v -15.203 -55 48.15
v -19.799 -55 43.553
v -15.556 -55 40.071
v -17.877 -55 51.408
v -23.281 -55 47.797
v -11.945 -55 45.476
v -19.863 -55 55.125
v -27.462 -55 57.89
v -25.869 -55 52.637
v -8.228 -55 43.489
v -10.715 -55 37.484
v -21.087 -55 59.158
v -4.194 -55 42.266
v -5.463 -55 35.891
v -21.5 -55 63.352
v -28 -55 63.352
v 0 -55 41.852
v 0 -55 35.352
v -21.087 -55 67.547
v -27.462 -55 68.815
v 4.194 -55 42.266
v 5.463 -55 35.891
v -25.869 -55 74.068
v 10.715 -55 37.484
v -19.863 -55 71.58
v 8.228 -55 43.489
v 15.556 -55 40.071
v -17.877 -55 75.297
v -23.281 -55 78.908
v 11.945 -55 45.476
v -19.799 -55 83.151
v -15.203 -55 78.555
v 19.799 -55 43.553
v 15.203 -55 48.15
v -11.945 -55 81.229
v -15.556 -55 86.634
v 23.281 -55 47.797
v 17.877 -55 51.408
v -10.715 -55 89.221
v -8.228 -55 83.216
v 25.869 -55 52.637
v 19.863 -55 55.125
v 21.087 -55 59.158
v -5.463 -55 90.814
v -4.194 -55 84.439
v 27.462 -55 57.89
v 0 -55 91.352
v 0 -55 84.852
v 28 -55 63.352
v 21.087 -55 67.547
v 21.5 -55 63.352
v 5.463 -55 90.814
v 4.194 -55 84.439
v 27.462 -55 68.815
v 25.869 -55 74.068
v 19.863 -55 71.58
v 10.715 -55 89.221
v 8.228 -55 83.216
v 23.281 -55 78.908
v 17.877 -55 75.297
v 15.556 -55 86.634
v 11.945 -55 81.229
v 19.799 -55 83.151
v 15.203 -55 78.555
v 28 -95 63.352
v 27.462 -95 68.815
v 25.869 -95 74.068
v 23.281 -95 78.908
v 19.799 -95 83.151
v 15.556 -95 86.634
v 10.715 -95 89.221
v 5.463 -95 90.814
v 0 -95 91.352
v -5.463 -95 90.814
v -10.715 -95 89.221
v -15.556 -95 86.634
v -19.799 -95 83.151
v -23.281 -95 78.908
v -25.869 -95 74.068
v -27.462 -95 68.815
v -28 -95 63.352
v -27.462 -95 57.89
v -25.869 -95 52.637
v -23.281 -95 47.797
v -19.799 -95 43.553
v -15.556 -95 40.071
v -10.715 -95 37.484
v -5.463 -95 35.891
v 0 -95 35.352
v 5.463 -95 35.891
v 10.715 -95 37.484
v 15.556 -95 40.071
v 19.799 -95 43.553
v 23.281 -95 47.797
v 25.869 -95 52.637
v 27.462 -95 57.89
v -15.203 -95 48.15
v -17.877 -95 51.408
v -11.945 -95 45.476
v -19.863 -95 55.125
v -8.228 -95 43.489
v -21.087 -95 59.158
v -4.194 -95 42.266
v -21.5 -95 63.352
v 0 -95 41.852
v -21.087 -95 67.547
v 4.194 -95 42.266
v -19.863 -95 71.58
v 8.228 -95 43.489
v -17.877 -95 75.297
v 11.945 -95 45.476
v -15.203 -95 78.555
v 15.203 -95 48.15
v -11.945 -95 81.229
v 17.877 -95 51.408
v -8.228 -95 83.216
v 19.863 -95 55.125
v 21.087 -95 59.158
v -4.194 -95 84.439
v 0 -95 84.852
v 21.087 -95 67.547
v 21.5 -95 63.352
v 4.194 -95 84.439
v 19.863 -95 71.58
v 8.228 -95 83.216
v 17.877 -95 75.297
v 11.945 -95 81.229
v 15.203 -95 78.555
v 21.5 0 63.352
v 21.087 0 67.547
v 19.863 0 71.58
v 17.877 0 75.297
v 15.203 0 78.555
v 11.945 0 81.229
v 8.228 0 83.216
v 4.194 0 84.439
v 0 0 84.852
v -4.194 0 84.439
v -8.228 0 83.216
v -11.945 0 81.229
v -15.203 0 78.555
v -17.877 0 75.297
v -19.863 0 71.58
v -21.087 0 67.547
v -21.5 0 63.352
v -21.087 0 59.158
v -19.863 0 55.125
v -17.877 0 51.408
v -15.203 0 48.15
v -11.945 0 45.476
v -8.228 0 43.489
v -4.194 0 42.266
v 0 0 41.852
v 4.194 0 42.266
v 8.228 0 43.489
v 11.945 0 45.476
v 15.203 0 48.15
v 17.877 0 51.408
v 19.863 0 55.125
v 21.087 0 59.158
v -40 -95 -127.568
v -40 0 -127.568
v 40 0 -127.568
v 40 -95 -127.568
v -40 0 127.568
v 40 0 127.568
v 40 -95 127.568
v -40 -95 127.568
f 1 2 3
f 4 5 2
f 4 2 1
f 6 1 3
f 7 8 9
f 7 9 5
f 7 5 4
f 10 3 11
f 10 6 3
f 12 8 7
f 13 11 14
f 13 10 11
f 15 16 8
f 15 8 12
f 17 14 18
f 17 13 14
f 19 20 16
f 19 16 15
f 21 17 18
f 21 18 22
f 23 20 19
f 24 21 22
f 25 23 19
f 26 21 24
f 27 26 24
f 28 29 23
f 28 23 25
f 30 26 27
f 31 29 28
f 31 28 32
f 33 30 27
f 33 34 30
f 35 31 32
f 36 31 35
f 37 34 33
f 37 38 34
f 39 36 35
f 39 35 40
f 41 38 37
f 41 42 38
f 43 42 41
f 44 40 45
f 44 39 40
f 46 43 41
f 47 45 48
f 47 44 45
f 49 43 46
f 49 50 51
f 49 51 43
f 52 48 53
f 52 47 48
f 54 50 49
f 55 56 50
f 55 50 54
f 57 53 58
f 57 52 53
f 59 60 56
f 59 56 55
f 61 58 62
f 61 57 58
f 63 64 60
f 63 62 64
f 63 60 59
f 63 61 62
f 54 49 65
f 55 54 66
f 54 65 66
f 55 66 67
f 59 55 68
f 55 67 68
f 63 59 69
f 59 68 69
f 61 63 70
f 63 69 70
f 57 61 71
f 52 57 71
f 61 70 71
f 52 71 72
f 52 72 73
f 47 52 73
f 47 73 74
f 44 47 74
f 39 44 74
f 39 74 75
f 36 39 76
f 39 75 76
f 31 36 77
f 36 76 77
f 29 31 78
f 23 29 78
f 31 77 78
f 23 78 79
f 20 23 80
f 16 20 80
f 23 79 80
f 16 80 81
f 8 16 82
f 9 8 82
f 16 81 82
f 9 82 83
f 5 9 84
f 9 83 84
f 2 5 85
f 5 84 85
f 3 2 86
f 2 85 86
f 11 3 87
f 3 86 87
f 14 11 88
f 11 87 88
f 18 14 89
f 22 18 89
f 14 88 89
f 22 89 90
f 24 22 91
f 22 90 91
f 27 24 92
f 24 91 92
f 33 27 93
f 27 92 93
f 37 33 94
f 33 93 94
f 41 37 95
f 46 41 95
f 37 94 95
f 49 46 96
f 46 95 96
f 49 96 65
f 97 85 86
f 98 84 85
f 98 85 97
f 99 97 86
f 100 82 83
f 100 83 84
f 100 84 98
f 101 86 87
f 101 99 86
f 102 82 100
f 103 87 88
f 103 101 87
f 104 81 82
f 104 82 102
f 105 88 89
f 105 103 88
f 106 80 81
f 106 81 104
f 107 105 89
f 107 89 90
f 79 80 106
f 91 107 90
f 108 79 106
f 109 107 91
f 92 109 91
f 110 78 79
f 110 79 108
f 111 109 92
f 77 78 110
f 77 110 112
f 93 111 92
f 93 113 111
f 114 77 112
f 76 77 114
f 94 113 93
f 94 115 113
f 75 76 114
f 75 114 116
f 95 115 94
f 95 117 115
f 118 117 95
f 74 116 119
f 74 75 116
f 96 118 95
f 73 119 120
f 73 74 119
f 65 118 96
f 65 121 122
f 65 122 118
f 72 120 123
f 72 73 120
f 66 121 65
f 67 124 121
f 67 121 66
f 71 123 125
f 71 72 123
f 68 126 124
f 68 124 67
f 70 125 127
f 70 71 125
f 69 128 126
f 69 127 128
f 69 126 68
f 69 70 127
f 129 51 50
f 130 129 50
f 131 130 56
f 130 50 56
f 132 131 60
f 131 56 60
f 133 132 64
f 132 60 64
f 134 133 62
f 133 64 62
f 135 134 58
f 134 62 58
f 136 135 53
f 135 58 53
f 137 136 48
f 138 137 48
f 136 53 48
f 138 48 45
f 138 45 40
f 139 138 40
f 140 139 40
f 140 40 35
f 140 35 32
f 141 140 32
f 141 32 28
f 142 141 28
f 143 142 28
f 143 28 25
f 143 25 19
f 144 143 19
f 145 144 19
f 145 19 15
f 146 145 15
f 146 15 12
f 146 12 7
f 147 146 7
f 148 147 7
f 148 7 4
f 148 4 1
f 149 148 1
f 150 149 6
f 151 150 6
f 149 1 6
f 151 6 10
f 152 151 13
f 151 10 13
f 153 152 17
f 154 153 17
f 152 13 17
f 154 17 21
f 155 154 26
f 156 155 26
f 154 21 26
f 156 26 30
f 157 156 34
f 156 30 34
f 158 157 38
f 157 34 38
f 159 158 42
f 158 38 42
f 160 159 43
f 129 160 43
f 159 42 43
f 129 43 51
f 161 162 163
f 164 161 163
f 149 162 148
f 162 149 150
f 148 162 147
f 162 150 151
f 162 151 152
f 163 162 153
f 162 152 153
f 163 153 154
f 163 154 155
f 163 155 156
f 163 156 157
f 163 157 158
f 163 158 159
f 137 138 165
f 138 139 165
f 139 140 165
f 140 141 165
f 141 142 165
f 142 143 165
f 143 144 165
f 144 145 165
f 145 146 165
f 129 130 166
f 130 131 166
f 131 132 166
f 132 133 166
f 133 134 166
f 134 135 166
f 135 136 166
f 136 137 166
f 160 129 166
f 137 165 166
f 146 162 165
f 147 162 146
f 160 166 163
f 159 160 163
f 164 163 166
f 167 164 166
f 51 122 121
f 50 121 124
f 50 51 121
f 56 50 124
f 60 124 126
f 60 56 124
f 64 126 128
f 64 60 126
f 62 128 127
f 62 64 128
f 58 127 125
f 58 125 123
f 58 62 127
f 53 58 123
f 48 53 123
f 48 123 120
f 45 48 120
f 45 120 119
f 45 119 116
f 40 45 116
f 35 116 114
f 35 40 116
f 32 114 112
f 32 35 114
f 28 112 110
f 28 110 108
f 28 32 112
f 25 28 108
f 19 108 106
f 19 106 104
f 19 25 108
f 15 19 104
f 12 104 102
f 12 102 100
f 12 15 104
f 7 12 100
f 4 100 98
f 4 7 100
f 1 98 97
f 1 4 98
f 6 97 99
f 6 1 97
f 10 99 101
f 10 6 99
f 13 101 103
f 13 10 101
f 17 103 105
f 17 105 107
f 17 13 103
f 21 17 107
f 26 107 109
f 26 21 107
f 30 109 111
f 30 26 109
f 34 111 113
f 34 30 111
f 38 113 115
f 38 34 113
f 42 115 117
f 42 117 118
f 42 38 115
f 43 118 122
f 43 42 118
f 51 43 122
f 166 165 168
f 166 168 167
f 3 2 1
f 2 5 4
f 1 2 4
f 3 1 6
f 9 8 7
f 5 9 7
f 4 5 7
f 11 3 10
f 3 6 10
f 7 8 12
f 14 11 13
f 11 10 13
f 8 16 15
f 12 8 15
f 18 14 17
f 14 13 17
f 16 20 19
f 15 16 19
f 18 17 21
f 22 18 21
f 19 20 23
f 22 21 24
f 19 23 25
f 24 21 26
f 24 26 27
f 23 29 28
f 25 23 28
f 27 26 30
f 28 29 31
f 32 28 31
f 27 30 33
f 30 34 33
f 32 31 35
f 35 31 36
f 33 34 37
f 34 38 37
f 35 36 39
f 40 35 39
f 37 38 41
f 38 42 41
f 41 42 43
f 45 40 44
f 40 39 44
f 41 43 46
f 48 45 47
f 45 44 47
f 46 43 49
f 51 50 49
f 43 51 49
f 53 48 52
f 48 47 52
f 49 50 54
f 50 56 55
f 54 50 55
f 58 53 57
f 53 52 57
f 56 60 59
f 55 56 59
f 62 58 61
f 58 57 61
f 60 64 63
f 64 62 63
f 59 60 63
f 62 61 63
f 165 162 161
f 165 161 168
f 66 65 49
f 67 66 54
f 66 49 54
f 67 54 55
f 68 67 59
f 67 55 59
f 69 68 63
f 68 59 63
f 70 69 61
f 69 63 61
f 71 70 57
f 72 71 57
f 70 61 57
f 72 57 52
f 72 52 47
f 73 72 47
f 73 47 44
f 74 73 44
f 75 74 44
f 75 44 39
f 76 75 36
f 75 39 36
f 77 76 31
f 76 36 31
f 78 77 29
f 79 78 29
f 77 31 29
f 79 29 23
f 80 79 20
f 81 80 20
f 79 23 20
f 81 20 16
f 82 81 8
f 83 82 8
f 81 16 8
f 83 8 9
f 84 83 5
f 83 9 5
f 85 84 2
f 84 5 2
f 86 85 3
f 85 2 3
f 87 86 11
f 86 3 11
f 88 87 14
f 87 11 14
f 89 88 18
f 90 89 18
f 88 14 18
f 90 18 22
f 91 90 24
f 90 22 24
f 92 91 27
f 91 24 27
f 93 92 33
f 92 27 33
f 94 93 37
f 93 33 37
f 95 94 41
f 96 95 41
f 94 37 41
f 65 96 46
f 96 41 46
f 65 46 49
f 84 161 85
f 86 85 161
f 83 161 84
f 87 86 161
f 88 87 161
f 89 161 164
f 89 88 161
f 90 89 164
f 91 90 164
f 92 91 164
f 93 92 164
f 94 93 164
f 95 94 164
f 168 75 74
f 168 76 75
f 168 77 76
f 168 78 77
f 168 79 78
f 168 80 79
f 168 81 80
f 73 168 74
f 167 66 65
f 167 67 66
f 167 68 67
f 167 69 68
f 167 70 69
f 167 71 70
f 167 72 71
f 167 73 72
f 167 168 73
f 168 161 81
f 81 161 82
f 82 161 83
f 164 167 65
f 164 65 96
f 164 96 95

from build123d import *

# Parameters (mm, degrees)
F0_W     = 80
F0_H     = 255.13507
F1_DEPTH = 95
F2_R     = 28
F3_DEPTH = 40
F4_R     = 21.5
F5_DEPTH = 55.001
F6_R     = 28
F6_R_2   = 21.5
F7_DEPTH = 40


with BuildPart() as f1:
    # F0 (on Front) → F1 (new body)
    with BuildSketch(Plane.XZ):
        Rectangle(F0_W, F0_H)
    extrude(amount=F1_DEPTH)

    # F2 (on face) → F3 (cut)
    with BuildSketch(Plane.XZ.offset(95)):
        with Locations((0, 63.352488)):
            Circle(F2_R)
    extrude(amount=-F3_DEPTH, mode=Mode.SUBTRACT)

    # F4 (on face) → F5 (cut, through all)
    with BuildSketch(Plane.XZ.offset(55)):
        with Locations((0, 63.352488)):
            Circle(F4_R)
    extrude(amount=-F5_DEPTH, mode=Mode.SUBTRACT)


with BuildPart() as f7:
    # F6 (on face) → F7 (new body)
    with BuildSketch(Plane.XZ.offset(55)):
        with Locations((0, 63.352488)):
            Circle(F6_R)
        with Locations((0, 63.352488)):
            Circle(F6_R_2, mode=Mode.SUBTRACT)
    extrude(amount=F7_DEPTH)


solid = Compound([f1.part, f7.part])
